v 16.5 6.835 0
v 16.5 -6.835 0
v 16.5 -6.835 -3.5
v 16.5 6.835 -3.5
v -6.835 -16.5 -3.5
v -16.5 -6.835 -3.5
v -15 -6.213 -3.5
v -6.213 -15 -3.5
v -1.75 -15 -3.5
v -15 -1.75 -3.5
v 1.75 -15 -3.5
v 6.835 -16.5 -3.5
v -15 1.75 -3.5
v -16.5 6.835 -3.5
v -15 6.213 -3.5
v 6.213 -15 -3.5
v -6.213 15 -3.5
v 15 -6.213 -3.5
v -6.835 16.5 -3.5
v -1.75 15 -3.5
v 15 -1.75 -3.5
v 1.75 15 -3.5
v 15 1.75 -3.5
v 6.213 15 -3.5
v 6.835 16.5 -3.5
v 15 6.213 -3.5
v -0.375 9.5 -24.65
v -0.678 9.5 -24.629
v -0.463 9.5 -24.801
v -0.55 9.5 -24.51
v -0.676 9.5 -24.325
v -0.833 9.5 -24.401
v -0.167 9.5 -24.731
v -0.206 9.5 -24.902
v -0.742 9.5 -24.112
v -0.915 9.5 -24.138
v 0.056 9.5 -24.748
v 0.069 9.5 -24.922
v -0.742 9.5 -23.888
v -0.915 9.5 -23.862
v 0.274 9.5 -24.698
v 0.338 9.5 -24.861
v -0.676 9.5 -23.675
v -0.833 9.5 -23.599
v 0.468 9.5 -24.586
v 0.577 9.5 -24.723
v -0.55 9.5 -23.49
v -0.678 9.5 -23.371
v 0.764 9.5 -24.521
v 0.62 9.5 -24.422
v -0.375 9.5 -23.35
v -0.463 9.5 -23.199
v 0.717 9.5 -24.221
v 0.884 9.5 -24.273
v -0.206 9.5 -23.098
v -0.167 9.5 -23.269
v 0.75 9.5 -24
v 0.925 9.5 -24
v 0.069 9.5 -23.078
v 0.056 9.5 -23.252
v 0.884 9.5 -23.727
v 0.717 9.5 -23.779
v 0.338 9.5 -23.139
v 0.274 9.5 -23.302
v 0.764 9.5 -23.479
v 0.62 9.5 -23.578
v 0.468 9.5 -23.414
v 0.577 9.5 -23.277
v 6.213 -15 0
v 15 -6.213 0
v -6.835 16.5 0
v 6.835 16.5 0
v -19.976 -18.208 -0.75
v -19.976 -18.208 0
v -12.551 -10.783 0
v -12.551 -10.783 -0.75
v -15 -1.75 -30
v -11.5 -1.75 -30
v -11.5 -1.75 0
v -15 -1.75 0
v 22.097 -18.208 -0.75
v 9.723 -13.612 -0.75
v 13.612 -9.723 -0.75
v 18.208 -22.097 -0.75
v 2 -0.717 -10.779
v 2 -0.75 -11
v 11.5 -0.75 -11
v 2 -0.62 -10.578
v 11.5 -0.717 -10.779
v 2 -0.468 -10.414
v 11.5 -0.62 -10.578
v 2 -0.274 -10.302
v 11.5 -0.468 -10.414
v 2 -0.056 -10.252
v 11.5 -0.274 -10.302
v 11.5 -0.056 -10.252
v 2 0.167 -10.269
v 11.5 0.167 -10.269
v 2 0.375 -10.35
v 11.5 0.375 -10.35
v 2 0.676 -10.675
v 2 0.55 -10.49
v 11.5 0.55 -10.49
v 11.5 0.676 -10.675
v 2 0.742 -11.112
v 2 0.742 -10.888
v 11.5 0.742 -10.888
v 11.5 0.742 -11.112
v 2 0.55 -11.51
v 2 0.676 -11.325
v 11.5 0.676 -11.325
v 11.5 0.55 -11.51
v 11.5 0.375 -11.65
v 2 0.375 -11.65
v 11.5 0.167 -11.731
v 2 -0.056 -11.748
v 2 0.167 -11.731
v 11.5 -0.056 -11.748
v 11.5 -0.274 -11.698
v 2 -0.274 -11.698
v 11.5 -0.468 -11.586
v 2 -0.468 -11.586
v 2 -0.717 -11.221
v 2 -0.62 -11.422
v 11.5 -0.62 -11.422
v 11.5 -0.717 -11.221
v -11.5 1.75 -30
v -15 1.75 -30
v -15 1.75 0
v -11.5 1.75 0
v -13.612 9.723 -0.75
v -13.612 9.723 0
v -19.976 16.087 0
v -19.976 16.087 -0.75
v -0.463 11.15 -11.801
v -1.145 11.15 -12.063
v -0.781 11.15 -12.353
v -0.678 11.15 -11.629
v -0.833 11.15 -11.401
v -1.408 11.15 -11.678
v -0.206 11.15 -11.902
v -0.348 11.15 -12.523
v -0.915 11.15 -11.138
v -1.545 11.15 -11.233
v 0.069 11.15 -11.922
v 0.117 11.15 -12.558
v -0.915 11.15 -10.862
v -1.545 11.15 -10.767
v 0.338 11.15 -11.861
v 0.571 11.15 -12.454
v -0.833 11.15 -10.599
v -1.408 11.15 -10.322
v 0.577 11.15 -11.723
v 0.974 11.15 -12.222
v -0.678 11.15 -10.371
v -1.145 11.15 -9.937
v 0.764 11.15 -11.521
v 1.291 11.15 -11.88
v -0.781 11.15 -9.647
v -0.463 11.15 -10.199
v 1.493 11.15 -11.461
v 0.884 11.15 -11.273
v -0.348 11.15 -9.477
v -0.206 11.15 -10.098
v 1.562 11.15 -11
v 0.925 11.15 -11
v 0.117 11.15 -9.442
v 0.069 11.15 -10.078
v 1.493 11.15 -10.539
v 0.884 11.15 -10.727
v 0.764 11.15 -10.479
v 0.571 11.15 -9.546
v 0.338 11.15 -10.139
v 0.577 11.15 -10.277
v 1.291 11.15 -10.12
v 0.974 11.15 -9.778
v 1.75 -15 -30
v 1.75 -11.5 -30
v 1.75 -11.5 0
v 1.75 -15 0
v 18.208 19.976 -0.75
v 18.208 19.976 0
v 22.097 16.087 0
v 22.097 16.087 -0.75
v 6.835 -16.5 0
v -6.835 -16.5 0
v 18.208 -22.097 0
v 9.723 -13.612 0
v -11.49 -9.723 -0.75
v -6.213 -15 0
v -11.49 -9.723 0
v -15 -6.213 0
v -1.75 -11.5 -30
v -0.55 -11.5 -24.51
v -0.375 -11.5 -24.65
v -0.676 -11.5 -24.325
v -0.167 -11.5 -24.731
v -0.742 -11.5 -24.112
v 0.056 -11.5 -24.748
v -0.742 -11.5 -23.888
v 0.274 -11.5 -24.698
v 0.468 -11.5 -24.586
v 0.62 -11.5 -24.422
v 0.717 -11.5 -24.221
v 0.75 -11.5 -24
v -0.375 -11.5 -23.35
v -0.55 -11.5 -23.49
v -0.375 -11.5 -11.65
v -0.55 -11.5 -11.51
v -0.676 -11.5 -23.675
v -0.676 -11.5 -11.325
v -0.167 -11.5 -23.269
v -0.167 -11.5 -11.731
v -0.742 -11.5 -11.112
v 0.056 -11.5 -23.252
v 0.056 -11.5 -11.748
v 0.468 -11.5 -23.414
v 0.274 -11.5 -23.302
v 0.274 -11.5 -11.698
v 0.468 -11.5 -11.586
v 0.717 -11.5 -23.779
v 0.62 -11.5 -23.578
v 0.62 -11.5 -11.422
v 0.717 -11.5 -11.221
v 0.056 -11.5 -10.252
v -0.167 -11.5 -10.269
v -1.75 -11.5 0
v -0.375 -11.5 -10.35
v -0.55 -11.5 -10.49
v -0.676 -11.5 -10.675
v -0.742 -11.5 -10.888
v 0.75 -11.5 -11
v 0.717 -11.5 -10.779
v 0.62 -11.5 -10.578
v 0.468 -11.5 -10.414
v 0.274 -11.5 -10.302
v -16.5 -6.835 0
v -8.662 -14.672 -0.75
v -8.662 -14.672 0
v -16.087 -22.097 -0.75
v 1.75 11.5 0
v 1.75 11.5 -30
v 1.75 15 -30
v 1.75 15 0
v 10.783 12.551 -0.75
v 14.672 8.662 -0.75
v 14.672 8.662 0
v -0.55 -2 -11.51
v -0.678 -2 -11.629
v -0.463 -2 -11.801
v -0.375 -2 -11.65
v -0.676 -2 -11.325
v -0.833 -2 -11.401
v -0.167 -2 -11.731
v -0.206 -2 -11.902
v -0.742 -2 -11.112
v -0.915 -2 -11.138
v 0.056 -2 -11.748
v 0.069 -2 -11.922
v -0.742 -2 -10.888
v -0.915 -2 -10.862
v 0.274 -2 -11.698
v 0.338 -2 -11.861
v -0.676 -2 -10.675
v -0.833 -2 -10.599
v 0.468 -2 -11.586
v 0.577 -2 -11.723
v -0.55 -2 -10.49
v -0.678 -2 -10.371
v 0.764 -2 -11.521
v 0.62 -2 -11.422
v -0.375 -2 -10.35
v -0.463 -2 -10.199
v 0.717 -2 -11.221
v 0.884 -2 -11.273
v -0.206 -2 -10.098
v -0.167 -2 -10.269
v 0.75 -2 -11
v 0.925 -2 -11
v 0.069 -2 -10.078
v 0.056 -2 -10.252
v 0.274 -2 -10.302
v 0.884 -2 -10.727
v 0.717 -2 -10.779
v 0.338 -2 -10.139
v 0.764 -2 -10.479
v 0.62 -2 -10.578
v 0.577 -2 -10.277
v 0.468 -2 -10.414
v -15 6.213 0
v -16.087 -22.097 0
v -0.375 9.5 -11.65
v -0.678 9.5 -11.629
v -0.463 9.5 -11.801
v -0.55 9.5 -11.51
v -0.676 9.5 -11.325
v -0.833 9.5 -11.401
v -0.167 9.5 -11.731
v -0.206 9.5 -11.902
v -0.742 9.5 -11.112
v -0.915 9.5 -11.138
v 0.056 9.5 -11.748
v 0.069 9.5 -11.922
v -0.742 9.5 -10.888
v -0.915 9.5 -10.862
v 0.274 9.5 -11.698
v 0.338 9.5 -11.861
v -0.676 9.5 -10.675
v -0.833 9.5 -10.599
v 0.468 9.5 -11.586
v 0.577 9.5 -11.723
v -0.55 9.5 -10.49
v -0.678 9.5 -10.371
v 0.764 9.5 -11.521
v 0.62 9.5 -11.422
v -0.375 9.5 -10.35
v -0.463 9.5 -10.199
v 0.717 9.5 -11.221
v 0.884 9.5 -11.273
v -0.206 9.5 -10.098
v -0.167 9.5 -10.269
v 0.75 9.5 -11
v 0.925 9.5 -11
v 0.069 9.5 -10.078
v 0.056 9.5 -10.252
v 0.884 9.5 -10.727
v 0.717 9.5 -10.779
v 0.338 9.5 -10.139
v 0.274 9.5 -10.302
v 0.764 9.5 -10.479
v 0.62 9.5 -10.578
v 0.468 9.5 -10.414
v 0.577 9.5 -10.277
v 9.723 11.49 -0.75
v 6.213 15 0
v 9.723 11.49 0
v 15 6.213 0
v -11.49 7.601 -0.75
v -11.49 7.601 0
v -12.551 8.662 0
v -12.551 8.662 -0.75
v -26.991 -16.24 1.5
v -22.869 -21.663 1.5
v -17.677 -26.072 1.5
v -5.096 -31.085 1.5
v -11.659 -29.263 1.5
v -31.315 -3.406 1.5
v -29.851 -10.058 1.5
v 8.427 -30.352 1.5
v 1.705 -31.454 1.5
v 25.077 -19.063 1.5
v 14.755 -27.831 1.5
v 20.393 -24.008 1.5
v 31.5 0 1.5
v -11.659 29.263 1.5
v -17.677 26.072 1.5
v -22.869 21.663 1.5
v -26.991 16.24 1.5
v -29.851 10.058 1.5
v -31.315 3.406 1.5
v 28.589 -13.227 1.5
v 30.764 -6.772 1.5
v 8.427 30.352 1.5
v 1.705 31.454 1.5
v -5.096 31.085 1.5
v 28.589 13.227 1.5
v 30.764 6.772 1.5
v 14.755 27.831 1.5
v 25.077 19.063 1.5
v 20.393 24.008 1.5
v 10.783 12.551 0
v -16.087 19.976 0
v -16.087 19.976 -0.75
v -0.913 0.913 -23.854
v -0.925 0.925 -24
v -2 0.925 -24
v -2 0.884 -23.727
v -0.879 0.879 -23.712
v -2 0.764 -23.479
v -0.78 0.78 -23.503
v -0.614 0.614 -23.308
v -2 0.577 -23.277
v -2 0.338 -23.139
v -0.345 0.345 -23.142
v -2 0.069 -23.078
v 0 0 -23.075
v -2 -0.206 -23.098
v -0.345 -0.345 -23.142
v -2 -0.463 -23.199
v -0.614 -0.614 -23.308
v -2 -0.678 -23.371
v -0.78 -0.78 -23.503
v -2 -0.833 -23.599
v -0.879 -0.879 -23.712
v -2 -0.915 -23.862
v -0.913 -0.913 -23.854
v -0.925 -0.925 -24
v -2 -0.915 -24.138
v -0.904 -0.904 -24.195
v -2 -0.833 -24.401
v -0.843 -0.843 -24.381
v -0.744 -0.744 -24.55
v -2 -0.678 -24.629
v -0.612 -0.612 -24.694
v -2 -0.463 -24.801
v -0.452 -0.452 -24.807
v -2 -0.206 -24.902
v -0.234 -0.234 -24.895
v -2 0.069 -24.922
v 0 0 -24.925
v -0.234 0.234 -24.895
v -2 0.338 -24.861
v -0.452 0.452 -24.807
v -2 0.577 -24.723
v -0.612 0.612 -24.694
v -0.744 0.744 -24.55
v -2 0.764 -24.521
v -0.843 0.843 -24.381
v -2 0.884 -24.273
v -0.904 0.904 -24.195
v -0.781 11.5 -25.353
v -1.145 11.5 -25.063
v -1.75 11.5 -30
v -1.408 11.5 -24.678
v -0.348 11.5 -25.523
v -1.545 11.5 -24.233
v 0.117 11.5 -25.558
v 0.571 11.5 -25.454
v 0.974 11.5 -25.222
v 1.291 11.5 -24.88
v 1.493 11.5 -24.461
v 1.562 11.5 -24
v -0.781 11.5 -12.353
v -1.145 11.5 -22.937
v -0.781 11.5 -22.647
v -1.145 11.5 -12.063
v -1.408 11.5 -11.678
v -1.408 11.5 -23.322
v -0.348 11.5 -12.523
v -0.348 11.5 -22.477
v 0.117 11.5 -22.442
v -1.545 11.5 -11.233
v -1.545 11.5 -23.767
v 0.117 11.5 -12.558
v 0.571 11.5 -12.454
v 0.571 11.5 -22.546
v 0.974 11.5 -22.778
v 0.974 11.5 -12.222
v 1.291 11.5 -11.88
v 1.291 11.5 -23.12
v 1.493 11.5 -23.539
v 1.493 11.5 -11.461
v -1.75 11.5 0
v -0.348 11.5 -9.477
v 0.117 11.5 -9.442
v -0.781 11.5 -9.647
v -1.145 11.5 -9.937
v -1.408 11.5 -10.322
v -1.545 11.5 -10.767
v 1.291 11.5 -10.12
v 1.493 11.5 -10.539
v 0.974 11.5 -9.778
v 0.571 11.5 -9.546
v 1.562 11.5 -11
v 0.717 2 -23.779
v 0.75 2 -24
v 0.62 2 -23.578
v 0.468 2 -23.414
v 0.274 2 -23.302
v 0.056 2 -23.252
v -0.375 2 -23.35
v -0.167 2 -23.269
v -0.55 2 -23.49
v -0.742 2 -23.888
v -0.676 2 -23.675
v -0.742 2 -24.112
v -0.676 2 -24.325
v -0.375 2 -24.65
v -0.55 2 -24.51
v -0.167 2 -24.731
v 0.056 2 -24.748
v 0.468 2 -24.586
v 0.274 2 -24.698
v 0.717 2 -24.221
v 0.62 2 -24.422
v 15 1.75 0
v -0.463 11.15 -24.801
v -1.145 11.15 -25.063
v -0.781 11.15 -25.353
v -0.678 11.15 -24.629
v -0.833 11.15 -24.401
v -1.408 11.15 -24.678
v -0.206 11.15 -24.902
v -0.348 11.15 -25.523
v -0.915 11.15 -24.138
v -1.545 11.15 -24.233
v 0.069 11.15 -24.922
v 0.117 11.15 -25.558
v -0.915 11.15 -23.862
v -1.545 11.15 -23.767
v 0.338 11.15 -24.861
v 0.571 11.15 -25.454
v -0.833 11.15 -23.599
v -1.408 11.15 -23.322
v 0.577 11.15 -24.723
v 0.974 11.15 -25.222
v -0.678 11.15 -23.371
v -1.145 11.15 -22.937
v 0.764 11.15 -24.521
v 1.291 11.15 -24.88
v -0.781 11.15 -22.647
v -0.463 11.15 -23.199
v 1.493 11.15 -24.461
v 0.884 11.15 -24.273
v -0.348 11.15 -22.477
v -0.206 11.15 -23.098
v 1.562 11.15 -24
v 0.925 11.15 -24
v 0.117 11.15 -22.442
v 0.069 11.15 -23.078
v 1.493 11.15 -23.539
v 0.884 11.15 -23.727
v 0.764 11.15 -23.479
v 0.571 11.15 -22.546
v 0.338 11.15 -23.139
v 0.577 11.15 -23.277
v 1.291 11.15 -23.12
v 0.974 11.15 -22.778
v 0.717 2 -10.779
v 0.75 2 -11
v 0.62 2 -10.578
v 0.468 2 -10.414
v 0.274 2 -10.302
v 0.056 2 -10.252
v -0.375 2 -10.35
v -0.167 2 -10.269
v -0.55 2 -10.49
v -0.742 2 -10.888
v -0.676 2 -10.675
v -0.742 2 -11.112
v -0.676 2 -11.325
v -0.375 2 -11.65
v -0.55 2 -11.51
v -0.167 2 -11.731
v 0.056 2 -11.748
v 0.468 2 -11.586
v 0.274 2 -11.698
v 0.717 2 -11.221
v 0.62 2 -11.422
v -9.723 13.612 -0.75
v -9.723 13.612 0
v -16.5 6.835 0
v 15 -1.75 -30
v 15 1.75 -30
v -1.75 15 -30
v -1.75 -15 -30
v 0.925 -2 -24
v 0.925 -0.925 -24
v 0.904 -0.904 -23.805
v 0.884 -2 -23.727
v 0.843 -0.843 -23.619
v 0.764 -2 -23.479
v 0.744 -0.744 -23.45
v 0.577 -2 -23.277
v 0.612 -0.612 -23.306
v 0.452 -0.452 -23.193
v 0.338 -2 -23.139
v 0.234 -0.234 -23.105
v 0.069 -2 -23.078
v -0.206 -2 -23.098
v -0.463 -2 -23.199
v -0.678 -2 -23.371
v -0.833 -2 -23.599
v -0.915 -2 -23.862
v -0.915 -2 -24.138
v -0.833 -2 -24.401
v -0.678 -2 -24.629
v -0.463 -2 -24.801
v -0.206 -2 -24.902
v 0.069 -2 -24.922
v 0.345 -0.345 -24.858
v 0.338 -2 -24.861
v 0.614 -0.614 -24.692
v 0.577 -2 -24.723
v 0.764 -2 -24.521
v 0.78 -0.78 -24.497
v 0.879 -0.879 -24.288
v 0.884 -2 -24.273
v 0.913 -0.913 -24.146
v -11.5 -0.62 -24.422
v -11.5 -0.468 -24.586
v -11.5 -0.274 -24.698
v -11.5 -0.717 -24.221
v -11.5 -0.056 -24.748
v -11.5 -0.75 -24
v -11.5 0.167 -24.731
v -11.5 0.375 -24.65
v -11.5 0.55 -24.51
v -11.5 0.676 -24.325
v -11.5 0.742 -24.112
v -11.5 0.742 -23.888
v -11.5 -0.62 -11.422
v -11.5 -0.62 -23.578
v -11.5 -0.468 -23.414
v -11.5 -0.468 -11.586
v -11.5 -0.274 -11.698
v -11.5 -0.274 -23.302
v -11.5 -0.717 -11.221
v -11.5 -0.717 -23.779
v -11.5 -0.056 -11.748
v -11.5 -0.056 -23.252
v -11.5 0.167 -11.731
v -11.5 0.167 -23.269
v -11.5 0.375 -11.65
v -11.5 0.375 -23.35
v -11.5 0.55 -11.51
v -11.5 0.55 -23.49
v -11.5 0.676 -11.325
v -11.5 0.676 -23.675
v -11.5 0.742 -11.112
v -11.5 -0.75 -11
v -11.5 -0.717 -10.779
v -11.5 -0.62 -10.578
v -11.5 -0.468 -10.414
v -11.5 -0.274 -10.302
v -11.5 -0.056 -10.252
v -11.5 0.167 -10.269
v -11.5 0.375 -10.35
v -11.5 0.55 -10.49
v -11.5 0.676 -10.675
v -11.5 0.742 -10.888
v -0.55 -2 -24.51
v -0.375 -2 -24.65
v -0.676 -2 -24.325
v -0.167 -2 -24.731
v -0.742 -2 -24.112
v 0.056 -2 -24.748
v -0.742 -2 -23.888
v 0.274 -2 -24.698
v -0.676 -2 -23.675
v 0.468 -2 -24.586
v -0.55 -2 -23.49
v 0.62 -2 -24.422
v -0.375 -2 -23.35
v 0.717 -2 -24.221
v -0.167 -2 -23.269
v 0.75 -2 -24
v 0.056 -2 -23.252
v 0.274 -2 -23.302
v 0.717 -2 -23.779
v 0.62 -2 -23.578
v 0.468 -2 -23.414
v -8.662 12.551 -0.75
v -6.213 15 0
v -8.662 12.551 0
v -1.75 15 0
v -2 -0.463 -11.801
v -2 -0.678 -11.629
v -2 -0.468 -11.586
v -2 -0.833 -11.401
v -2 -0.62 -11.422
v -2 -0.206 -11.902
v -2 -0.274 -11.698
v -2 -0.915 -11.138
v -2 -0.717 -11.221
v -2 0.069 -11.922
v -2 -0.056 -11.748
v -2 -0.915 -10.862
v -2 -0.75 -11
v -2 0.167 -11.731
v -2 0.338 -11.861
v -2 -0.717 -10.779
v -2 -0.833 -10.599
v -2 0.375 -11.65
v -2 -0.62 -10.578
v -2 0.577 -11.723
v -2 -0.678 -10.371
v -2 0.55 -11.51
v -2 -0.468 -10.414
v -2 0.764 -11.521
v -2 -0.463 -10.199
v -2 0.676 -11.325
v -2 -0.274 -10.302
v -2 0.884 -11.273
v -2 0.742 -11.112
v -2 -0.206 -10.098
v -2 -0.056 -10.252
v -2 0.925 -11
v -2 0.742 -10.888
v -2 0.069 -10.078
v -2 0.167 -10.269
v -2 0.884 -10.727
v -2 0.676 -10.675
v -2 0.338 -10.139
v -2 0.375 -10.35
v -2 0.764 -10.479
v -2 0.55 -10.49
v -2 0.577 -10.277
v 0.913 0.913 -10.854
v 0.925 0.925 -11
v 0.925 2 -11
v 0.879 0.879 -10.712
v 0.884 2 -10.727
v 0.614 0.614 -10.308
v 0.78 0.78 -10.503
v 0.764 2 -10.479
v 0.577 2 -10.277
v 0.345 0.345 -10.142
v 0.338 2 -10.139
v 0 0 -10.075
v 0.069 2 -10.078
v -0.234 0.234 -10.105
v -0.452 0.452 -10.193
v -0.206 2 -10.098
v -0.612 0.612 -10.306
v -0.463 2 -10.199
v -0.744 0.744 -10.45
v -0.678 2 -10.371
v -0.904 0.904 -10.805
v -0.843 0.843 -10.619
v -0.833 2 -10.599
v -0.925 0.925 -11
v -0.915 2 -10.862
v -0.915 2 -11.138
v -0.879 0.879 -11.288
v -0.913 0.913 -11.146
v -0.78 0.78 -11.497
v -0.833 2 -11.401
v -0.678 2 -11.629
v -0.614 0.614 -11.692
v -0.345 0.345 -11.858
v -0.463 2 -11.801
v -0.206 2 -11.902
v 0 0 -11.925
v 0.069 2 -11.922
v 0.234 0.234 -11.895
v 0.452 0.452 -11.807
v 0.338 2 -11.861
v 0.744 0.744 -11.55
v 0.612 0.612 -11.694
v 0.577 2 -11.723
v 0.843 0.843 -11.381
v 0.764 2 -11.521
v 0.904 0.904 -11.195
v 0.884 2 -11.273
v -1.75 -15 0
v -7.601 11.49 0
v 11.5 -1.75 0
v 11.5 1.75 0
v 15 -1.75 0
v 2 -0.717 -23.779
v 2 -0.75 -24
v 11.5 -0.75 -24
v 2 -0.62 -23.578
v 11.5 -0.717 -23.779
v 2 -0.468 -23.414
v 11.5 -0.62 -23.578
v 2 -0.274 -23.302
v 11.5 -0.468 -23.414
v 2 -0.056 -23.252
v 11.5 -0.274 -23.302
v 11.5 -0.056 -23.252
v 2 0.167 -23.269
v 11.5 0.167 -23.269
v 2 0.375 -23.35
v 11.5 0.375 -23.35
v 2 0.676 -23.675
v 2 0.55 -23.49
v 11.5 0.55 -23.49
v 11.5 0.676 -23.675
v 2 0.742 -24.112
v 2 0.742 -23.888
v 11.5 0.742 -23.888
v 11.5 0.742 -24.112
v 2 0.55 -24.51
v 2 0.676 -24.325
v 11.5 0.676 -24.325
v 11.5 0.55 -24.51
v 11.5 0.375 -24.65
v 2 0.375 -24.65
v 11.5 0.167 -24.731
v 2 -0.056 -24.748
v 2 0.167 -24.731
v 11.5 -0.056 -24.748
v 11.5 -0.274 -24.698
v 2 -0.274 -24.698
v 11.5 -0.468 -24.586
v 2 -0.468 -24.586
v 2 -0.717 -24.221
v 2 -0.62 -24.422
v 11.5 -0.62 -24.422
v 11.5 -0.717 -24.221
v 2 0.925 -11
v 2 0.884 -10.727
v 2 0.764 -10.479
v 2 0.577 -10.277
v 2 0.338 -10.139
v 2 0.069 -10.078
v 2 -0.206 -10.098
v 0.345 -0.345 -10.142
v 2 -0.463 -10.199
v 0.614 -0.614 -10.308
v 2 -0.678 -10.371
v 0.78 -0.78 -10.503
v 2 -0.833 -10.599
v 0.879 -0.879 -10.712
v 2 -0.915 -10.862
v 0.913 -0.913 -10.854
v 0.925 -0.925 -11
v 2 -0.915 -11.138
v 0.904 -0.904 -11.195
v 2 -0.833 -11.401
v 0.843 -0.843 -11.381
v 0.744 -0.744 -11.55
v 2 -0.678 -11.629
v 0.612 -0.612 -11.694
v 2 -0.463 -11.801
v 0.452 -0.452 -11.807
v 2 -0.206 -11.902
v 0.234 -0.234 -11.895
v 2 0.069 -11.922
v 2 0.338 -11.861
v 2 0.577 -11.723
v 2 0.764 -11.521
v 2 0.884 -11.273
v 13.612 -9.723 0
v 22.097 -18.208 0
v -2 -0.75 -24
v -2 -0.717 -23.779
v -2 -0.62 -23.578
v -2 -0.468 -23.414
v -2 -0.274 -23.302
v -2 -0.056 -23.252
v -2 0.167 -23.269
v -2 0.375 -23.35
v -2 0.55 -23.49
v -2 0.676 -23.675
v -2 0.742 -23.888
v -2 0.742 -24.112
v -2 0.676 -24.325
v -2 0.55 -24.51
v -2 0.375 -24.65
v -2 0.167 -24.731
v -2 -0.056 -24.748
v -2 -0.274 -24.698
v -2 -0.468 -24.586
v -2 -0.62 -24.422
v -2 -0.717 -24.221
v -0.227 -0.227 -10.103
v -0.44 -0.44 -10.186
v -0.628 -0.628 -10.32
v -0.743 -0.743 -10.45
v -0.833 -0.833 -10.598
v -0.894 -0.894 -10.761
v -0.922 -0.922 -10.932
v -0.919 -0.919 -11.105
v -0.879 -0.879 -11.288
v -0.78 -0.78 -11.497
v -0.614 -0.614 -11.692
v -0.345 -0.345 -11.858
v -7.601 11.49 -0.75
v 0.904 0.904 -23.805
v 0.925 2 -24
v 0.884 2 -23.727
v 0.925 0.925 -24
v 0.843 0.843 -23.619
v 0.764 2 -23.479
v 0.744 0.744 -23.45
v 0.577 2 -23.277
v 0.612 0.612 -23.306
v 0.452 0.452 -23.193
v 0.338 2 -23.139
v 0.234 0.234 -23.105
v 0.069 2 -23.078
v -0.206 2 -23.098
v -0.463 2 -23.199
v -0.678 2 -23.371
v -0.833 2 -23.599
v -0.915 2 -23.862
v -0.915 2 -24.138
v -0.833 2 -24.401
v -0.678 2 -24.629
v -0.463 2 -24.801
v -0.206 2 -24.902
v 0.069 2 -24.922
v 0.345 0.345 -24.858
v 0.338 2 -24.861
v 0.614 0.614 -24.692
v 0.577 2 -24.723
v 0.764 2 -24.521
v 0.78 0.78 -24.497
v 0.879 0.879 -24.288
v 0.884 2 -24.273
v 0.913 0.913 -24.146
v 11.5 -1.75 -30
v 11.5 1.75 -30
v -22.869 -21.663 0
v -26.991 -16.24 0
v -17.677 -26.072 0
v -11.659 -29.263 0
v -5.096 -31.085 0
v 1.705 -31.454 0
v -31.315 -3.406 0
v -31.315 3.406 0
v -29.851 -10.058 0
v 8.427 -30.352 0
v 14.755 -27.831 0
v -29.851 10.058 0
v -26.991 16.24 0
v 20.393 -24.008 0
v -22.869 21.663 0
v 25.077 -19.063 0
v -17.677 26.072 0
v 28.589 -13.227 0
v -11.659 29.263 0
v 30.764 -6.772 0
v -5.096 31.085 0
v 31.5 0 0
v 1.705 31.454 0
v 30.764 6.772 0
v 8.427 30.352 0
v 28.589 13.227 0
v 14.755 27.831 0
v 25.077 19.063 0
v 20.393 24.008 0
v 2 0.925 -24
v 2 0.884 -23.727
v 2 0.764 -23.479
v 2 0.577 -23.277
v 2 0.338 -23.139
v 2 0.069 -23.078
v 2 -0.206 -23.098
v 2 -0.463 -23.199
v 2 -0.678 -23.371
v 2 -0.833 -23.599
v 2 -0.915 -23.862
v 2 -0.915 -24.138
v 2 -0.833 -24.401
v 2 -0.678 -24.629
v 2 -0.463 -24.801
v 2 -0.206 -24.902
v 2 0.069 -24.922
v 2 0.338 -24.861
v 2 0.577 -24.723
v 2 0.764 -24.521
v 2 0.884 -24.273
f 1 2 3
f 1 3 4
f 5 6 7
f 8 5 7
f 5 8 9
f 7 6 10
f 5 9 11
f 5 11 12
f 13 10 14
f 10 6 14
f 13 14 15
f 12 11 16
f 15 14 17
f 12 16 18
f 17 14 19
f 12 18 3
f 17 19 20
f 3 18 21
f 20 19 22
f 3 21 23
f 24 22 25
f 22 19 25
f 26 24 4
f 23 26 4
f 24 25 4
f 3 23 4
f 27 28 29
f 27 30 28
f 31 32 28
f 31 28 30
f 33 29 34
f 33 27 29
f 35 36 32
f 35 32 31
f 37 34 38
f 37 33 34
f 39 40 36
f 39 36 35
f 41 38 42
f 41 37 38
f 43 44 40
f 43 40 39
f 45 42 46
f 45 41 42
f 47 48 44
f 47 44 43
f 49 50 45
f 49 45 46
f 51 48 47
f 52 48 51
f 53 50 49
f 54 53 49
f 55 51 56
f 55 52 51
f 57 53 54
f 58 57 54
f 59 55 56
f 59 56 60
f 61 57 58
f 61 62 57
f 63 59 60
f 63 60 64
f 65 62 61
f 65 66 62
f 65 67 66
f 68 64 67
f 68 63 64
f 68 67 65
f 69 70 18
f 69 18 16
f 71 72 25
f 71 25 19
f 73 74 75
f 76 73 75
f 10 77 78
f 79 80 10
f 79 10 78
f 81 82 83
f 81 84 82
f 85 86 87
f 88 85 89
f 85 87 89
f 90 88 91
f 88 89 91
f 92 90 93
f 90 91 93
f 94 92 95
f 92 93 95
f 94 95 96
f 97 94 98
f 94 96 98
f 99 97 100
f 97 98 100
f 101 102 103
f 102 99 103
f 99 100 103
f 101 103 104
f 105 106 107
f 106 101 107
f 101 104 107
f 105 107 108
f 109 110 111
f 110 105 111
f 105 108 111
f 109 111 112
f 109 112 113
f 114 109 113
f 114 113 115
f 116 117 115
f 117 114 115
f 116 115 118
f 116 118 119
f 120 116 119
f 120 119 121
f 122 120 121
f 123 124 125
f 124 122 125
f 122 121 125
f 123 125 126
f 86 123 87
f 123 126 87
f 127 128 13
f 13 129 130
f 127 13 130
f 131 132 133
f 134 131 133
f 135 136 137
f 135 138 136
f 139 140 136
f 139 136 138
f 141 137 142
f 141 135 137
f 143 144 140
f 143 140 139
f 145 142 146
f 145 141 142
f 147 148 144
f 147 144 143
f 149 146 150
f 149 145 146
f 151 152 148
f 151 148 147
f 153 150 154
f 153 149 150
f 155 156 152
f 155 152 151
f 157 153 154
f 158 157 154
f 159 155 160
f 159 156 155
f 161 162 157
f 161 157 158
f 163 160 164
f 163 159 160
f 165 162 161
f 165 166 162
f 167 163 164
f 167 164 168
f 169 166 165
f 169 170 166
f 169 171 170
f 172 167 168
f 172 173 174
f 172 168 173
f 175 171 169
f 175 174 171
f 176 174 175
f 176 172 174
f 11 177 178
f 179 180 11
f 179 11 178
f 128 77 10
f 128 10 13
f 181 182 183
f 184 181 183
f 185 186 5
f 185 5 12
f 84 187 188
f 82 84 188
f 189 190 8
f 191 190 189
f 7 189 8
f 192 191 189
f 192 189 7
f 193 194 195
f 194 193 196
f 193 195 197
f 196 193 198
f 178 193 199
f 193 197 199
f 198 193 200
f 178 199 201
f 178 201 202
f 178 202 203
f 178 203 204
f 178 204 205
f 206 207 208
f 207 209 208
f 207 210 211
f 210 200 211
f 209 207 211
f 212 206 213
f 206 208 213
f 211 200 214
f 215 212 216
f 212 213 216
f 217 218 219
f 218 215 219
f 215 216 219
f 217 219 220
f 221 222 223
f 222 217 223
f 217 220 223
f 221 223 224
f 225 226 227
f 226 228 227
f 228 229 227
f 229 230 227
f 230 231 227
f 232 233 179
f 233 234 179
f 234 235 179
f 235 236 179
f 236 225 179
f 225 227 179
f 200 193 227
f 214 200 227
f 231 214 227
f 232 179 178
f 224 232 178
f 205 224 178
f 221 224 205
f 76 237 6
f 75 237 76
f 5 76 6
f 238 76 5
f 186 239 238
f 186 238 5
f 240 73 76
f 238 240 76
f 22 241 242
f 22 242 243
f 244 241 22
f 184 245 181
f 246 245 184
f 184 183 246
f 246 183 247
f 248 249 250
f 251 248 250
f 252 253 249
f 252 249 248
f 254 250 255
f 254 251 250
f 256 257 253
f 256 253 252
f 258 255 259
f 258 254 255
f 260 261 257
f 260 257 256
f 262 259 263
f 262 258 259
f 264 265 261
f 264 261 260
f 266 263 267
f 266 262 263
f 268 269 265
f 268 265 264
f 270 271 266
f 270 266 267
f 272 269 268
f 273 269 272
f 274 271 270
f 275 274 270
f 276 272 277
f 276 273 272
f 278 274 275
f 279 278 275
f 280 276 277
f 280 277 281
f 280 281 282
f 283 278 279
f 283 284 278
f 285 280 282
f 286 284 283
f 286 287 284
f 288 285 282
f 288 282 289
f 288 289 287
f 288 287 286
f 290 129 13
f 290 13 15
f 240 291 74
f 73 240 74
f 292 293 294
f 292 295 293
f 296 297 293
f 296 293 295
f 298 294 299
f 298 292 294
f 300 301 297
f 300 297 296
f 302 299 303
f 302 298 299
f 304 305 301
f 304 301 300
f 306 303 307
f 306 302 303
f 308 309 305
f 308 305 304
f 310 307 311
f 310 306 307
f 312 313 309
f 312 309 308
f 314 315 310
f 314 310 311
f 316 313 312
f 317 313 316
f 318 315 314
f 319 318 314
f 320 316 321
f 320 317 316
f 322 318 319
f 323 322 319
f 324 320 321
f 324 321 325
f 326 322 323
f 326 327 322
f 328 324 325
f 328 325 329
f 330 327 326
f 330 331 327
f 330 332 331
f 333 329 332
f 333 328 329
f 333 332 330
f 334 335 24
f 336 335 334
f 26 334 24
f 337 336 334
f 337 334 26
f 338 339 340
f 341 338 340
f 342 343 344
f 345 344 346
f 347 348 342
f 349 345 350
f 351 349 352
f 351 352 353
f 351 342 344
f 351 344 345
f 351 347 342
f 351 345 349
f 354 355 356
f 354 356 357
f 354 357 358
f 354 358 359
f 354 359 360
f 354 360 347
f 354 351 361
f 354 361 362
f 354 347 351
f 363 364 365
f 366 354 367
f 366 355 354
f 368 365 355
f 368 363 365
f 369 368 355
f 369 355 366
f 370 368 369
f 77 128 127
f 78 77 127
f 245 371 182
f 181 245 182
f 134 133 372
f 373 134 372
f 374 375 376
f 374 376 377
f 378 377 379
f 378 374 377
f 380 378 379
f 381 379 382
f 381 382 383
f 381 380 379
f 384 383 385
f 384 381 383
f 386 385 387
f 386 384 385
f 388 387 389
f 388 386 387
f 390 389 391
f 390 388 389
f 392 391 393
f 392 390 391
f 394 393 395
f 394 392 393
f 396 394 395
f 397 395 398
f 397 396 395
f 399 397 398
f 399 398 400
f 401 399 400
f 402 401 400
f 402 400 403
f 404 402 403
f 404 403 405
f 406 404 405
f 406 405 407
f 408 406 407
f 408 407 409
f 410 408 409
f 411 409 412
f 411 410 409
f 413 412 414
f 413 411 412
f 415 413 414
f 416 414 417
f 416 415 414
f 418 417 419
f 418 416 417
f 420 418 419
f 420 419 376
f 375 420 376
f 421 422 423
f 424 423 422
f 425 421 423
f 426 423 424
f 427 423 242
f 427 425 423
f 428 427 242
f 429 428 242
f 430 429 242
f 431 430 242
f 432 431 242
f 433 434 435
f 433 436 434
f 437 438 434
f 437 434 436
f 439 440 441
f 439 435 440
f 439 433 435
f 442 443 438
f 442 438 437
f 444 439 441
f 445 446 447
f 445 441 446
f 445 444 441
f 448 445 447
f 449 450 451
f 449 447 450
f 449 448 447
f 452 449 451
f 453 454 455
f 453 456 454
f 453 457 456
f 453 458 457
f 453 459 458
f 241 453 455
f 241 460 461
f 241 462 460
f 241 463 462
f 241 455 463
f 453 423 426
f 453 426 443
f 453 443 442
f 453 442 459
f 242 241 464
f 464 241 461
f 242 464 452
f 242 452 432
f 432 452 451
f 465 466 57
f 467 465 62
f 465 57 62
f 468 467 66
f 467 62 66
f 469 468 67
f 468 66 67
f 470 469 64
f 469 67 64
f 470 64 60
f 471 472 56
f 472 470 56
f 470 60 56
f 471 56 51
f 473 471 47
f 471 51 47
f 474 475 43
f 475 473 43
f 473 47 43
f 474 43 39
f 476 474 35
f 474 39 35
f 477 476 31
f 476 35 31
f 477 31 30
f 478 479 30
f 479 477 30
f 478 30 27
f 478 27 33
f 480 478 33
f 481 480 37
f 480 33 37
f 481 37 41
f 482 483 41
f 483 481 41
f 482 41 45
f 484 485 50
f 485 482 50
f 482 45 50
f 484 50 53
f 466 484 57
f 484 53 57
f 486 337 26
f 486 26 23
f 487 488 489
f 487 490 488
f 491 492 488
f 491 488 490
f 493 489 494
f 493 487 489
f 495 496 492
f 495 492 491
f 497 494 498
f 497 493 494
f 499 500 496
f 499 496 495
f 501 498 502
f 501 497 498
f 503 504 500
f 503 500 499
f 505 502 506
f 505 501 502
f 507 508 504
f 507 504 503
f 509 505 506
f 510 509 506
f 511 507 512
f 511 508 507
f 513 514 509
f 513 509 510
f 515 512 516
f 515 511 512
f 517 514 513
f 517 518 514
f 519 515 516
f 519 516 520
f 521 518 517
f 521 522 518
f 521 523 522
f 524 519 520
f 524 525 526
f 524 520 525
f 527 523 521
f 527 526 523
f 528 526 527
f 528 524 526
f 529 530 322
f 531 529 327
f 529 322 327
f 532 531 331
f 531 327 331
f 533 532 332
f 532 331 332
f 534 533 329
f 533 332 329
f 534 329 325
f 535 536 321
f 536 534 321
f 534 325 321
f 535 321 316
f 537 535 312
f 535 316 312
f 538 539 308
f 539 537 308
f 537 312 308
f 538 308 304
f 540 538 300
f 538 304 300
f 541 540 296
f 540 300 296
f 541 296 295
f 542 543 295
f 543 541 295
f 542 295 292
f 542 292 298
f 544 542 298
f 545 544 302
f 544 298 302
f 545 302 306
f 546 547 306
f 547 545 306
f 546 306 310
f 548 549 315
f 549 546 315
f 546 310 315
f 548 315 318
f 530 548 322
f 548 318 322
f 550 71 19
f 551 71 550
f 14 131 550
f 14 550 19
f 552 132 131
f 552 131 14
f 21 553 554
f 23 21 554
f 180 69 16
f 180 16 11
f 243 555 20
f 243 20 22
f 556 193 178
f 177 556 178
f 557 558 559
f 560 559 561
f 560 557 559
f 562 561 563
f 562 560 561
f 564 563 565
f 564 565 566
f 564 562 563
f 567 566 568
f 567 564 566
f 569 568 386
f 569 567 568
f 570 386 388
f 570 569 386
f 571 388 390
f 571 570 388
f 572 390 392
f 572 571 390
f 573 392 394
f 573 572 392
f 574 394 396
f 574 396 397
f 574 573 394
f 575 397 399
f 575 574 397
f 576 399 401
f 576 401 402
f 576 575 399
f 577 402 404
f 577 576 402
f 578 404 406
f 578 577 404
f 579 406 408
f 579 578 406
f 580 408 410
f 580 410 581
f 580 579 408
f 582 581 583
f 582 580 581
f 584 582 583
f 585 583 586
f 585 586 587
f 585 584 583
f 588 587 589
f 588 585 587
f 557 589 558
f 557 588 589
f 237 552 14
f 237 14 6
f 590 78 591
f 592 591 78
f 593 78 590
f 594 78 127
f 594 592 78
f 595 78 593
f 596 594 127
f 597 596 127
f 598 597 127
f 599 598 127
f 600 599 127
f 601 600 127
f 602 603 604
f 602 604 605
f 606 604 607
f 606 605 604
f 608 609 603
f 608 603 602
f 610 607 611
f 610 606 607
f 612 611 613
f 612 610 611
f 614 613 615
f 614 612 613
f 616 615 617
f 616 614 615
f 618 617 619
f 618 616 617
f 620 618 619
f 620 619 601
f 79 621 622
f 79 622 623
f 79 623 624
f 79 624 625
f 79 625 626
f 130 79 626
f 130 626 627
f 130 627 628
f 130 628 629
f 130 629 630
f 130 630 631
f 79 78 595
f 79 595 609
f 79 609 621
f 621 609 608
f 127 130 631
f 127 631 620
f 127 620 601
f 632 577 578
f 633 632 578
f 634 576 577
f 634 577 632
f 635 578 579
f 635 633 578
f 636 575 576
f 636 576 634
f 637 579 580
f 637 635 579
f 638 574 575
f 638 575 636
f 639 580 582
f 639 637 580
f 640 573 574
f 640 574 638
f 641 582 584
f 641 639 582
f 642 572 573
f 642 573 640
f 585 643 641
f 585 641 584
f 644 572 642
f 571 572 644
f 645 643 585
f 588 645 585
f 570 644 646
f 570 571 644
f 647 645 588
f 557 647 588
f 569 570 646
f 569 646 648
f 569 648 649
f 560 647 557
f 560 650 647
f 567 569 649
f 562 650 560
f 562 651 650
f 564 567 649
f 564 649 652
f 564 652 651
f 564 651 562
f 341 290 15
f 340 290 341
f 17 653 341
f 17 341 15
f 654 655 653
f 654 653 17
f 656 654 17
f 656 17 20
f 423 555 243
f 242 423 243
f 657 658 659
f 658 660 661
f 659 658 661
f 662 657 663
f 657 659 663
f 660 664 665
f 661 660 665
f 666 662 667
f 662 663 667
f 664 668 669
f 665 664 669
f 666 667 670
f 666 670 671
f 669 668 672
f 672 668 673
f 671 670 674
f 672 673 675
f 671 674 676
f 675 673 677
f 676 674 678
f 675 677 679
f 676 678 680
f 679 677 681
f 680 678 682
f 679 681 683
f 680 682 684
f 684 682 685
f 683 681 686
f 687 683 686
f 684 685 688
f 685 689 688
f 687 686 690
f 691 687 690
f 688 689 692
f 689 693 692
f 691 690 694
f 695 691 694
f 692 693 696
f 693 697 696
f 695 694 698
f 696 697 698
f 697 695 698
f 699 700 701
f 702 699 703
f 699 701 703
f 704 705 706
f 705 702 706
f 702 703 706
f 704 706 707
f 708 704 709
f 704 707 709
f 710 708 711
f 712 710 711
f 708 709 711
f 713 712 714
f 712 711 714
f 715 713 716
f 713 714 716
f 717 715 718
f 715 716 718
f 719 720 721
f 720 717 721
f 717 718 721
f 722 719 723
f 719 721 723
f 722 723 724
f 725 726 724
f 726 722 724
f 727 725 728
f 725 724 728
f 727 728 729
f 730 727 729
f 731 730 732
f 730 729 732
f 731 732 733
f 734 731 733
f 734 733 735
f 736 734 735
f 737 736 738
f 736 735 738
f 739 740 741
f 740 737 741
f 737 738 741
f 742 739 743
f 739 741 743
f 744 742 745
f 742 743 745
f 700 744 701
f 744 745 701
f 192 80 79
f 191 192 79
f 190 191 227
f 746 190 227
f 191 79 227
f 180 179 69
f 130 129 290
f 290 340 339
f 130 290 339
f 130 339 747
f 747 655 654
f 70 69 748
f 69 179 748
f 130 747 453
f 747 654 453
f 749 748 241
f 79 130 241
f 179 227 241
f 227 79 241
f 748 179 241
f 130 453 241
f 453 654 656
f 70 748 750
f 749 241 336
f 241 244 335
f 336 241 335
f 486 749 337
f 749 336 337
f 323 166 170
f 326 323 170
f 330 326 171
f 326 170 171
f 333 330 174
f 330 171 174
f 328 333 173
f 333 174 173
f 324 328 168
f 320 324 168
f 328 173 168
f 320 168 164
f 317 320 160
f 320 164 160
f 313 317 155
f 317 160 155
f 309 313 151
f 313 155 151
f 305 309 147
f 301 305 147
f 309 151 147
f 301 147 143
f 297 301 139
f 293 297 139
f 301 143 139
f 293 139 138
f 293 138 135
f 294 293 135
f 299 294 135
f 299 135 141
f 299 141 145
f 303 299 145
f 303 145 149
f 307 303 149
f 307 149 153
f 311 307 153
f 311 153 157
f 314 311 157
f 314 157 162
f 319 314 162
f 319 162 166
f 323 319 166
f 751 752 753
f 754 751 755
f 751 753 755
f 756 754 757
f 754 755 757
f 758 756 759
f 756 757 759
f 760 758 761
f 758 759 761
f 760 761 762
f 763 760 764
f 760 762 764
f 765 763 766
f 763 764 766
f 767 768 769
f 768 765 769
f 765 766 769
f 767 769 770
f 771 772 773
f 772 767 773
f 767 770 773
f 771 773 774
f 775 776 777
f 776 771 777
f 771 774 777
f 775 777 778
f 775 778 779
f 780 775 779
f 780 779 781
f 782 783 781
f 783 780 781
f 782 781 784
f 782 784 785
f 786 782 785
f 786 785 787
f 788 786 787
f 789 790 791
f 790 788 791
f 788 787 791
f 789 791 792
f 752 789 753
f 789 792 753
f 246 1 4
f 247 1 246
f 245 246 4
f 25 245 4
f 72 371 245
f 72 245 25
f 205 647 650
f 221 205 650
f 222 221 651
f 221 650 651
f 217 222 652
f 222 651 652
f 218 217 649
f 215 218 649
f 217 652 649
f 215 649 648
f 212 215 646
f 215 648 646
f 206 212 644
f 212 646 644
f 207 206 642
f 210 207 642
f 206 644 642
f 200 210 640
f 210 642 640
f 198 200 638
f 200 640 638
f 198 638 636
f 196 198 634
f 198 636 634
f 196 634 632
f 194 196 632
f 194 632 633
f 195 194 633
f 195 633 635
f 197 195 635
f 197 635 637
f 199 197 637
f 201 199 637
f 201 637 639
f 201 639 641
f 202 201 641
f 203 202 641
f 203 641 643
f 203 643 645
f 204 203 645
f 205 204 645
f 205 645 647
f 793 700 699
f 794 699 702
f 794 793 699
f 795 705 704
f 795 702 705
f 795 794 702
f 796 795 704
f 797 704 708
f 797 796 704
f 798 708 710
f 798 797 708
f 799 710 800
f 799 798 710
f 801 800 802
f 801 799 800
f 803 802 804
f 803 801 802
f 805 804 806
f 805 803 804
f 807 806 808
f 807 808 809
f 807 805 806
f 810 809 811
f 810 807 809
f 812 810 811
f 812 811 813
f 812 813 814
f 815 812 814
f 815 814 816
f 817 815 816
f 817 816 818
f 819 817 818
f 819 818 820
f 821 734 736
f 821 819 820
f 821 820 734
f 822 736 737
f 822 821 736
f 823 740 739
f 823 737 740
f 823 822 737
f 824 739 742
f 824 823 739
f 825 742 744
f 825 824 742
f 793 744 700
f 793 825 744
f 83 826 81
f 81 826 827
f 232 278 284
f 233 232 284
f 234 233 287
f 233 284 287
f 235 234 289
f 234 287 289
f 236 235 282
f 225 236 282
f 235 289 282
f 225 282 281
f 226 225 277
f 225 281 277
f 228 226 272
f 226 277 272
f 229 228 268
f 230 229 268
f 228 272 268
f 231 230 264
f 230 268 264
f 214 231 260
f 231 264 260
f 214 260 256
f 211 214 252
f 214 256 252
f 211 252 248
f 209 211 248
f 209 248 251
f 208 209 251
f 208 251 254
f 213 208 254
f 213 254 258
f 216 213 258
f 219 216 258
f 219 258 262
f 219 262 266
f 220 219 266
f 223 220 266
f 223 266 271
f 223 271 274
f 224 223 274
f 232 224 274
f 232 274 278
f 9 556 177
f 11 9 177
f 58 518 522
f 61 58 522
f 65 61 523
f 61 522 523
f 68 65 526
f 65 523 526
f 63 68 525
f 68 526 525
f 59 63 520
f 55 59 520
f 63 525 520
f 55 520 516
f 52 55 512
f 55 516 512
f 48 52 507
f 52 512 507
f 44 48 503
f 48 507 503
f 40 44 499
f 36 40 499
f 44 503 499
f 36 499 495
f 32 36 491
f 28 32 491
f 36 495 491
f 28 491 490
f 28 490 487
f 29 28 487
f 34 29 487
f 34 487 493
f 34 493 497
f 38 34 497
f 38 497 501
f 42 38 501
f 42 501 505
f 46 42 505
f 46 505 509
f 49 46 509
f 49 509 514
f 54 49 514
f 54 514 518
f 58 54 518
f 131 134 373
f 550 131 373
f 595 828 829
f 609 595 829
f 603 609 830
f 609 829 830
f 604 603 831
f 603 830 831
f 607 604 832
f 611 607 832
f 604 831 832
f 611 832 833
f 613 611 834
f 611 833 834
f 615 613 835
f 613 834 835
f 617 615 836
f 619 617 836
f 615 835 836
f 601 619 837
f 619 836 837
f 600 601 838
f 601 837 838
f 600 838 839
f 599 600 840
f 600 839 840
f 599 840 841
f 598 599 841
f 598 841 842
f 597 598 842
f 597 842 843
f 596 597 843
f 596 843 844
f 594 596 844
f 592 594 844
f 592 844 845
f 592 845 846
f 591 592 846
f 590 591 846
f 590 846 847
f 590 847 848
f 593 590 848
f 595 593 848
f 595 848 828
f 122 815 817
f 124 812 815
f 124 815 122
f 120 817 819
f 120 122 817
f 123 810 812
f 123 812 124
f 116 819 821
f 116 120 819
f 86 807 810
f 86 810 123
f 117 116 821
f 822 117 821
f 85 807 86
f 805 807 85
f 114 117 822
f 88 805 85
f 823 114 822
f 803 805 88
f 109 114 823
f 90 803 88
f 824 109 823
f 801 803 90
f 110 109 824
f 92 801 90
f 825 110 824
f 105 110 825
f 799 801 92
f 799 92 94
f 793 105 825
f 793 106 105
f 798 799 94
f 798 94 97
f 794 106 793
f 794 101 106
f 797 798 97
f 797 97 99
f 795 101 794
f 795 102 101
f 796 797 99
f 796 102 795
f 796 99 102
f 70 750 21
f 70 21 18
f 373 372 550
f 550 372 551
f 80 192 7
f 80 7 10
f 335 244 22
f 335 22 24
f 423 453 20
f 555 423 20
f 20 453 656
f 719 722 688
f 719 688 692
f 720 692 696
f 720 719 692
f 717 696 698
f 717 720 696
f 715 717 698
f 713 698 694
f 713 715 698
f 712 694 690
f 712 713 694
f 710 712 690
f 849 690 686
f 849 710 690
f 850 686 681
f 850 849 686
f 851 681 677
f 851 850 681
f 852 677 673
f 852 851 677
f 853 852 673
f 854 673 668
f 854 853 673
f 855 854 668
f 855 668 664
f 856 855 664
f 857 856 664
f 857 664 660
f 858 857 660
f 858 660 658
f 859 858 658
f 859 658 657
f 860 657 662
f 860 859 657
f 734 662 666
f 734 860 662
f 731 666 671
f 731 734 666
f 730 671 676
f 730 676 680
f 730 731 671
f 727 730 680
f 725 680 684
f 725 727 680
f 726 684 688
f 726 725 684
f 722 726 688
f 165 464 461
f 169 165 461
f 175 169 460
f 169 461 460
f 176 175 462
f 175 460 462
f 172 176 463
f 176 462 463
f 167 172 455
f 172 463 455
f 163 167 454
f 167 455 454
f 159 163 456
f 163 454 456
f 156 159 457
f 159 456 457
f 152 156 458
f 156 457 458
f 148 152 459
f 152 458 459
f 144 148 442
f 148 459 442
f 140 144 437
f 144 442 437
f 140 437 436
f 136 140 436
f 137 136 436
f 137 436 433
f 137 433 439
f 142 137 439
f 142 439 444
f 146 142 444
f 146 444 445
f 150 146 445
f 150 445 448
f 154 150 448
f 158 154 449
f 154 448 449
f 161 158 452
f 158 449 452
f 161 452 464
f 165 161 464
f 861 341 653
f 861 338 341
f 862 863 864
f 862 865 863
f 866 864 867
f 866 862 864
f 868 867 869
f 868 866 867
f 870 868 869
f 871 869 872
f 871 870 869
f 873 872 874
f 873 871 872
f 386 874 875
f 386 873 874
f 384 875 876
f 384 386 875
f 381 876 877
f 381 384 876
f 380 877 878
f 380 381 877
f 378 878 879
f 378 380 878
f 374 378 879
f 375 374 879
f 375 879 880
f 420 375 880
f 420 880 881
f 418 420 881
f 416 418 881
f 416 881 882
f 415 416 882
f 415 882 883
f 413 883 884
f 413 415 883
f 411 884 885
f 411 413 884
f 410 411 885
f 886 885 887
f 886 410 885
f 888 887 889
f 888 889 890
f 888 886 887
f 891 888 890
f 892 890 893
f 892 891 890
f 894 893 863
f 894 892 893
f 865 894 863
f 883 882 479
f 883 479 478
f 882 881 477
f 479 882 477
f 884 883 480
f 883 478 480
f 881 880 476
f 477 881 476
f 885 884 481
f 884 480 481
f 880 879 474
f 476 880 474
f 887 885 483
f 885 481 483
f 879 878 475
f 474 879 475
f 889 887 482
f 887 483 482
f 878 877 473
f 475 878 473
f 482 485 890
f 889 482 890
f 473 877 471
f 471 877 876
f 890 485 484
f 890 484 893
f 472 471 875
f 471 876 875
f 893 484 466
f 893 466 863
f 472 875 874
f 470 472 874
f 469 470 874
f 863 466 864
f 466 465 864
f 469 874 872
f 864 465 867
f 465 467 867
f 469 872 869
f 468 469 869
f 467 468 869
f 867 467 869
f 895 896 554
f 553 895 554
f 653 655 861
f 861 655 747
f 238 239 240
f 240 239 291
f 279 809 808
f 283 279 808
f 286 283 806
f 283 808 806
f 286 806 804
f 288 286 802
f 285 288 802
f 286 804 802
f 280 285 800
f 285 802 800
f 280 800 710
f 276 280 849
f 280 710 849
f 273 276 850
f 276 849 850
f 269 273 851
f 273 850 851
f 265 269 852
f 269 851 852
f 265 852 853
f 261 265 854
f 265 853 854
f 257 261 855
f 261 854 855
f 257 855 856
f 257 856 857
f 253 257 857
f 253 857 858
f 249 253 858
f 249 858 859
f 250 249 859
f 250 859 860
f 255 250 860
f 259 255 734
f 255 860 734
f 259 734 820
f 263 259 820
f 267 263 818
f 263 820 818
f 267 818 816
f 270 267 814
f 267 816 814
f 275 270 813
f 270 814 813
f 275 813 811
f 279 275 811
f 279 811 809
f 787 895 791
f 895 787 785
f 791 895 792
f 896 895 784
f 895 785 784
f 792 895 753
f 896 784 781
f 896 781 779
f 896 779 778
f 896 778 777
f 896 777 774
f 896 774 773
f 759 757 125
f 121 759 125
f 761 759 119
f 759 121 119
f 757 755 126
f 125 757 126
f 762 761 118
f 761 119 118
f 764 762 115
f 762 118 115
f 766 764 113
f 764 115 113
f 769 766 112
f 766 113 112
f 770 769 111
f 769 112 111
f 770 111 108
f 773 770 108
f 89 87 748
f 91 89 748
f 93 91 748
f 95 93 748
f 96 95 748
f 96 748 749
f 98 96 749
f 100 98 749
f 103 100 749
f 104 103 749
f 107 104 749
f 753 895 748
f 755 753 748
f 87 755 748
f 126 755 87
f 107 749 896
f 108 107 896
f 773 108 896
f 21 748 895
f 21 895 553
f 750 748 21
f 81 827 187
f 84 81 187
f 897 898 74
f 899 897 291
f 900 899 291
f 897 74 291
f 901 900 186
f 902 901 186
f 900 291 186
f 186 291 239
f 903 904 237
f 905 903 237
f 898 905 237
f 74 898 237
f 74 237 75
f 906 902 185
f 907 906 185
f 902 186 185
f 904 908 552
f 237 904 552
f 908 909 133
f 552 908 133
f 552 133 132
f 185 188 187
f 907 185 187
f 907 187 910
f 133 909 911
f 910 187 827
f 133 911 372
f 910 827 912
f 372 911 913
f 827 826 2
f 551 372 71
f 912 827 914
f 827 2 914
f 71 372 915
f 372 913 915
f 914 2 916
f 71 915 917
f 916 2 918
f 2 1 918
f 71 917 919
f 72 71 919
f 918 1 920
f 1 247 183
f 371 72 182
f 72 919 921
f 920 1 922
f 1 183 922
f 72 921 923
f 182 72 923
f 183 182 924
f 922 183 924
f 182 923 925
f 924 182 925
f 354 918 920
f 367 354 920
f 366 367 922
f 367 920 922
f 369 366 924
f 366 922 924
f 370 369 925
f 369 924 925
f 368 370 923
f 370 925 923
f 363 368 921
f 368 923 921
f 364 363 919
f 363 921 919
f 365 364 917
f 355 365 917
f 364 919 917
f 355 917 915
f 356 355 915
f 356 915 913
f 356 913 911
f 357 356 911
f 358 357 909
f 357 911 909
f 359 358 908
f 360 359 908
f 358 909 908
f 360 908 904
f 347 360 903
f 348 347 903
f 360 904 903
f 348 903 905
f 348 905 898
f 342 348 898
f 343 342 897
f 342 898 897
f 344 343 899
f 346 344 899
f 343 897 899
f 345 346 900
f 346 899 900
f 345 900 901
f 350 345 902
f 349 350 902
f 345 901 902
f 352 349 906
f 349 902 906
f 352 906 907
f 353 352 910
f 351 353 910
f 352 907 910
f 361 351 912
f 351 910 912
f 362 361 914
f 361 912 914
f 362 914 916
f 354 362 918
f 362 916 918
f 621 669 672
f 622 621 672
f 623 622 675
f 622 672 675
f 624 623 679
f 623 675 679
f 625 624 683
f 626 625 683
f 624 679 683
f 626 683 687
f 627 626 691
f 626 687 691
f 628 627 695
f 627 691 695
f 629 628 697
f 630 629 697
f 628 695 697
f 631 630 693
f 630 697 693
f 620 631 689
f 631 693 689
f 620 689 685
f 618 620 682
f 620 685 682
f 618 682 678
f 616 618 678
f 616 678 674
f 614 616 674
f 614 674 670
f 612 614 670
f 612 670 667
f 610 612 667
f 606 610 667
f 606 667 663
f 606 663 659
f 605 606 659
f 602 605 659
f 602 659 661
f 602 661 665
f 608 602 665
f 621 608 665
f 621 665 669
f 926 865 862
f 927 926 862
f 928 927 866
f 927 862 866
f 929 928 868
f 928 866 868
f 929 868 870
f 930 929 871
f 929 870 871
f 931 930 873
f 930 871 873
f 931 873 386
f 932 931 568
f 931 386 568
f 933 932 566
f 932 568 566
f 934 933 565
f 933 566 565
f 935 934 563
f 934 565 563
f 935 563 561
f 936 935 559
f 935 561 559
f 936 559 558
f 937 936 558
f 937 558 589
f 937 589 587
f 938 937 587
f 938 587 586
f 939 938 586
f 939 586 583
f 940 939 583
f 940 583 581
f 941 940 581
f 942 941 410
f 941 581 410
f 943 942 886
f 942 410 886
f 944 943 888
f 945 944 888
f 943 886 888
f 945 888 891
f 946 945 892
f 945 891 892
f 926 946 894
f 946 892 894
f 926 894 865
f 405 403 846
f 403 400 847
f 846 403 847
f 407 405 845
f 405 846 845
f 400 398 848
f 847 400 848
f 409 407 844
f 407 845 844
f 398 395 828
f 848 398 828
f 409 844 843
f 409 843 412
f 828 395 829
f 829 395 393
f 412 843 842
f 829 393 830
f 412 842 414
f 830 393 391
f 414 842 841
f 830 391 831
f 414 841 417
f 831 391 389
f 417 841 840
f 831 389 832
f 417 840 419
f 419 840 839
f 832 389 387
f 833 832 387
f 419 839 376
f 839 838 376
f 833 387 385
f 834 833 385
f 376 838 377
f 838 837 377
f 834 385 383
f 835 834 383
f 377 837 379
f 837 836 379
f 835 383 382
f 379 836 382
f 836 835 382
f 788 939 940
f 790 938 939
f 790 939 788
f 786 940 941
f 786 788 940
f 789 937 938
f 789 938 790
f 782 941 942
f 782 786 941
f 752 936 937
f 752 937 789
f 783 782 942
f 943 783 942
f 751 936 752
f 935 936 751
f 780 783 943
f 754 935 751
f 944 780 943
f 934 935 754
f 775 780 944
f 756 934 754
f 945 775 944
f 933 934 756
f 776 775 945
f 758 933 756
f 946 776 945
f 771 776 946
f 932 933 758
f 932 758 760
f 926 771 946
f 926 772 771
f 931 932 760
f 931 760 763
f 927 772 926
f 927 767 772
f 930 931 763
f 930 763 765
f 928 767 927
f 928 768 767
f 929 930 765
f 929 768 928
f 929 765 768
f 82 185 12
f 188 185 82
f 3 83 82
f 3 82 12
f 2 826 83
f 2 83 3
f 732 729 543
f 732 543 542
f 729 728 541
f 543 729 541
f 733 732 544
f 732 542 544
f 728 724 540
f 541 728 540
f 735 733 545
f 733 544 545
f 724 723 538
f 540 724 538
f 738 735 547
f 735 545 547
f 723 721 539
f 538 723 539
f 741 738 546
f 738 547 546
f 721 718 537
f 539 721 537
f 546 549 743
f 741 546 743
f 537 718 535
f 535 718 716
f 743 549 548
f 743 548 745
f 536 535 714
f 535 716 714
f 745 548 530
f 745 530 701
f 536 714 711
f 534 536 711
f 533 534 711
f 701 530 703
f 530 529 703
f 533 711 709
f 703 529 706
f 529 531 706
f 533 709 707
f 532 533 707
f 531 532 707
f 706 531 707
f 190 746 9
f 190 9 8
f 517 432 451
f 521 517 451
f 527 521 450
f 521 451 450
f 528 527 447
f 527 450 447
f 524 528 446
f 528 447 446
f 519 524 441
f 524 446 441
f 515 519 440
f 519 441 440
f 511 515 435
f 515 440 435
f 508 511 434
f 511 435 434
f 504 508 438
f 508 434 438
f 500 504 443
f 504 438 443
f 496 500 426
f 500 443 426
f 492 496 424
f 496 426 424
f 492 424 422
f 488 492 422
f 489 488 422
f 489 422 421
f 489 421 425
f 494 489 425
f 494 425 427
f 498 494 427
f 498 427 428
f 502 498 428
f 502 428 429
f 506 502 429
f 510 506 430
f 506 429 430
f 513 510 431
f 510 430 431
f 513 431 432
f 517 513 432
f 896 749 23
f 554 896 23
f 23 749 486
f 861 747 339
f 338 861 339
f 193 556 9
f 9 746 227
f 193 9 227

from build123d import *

# Parameters (mm, degrees)
F0_R      = 31.5
F1_DEPTH  = 1.5
F3_DEPTH  = 3.5
F4_W      = 3.5
F4_H      = 3.5
F5_DEPTH  = 30
F6_R      = 0.75
F7_DEPTH  = 23
F8_R      = 0.75
F9_DEPTH  = 23
F10_R     = 0.925
F11_DEPTH = 2
F12_R     = 0.925
F13_DEPTH = 2
F6_R_2    = 0.925
F14_DEPTH = 2
F6_R_3    = 1.5625
F15_DEPTH = 0.35
F17_DEPTH = 0.75


with BuildPart() as f1:
    # F0 (on Top) → F1 (new body)
    with BuildSketch(Plane.XY):
        Circle(F0_R)
    extrude(amount=F1_DEPTH)

    # F2 (on Top) → F3 (join)
    with BuildSketch(Plane.XY):
        Polygon((-6.834524, 16.5), (-16.5, 6.834524), (-16.5, -6.834524), (-6.834524, -16.5), (6.834524, -16.5), (16.5, -6.834524), (16.5, 6.834524), (6.834524, 16.5), align=None)
        Polygon((6.213203, -15), (-6.213203, -15), (-15, -6.213203), (-15, 6.213203), (-6.213203, 15), (6.213203, 15), (15, 6.213203), (15, -6.213203), align=None, mode=Mode.SUBTRACT)
    extrude(amount=-F3_DEPTH)

    # F4 (on Top) → F5 (join)
    with BuildSketch(Plane.XY):
        with Locations((0, -13.25)):
            Rectangle(F4_W, F4_H)
        with Locations((13.25, 0)):
            Rectangle(F4_W, F4_H)
        with Locations((0, 13.25)):
            Rectangle(F4_W, F4_H)
        with Locations((-13.25, 0)):
            Rectangle(F4_W, F4_H)
    extrude(amount=-F5_DEPTH)

    # F6 (on face) → F7 (join, through all)
    with BuildSketch(Plane.XZ.offset(-11.5)):
        with Locations((0, -11)):
            Circle(F6_R)
        with Locations((0, -24)):
            Circle(F6_R)
    extrude(amount=F7_DEPTH)

    # F8 (on face) → F9 (join, through all)
    with BuildSketch(Plane(origin=(11.5, 0, 0), x_dir=(0, -1, 0), z_dir=(-1, 0, 0))):
        with Locations((0, -24)):
            Circle(F8_R)
        with Locations((0, -11)):
            Circle(F8_R)
    extrude(amount=F9_DEPTH)

    # F10 (on Front) → F11 (join, symmetric)
    with BuildSketch(Plane.XZ):
        with Locations((0, -11)):
            Circle(F10_R)
        with Locations((0, -24)):
            Circle(F10_R)
    extrude(amount=F11_DEPTH, both=True)

    # F12 (on Right) → F13 (join, symmetric)
    with BuildSketch(Plane.YZ):
        with Locations((0, -24)):
            Circle(F12_R)
        with Locations((0, -11)):
            Circle(F12_R)
    extrude(amount=F13_DEPTH, both=True)

    # F6 (on face) → F14 (join)
    with BuildSketch(Plane.XZ.offset(-11.5)):
        with Locations((0, -24)):
            Circle(F6_R_2)
        with Locations((0, -24)):
            Circle(F6_R, mode=Mode.SUBTRACT)
        with Locations((0, -11)):
            Circle(F6_R_2)
        with Locations((0, -11)):
            Circle(F6_R, mode=Mode.SUBTRACT)
    extrude(amount=F14_DEPTH)

    # F6 (on face) → F15 (join)
    with BuildSketch(Plane.XZ.offset(-11.5)):
        with Locations((0, -24)):
            Circle(F6_R_3)
        with Locations((0, -24)):
            Circle(F6_R_2, mode=Mode.SUBTRACT)
        with Locations((0, -11)):
            Circle(F6_R_3)
        with Locations((0, -11)):
            Circle(F6_R_2, mode=Mode.SUBTRACT)
    extrude(amount=F15_DEPTH)

    # F16 (on face) → F17 (join)
    with BuildSketch(Plane(origin=(0, 0, 0), x_dir=(1, 0, 0), z_dir=(0, 0, -1))):
        Polygon((9.722718, 13.611806), (13.611806, 9.722718), (22.097087, 18.208), (18.208, 22.097087), align=None)
        Polygon((-19.975767, 18.208), (-11.490485, 9.722718), (-7.601398, 13.611806), (-16.086679, 22.097087), align=None)
        Polygon((-16.086679, -19.975767), (-7.601398, -11.490485), (-11.490485, -7.601398), (-19.975767, -16.086679), align=None)
        Polygon((22.097087, -16.086679), (13.611806, -7.601398), (9.722718, -11.490485), (18.208, -19.975767), align=None)
    extrude(amount=F17_DEPTH)


solid = f1.part
